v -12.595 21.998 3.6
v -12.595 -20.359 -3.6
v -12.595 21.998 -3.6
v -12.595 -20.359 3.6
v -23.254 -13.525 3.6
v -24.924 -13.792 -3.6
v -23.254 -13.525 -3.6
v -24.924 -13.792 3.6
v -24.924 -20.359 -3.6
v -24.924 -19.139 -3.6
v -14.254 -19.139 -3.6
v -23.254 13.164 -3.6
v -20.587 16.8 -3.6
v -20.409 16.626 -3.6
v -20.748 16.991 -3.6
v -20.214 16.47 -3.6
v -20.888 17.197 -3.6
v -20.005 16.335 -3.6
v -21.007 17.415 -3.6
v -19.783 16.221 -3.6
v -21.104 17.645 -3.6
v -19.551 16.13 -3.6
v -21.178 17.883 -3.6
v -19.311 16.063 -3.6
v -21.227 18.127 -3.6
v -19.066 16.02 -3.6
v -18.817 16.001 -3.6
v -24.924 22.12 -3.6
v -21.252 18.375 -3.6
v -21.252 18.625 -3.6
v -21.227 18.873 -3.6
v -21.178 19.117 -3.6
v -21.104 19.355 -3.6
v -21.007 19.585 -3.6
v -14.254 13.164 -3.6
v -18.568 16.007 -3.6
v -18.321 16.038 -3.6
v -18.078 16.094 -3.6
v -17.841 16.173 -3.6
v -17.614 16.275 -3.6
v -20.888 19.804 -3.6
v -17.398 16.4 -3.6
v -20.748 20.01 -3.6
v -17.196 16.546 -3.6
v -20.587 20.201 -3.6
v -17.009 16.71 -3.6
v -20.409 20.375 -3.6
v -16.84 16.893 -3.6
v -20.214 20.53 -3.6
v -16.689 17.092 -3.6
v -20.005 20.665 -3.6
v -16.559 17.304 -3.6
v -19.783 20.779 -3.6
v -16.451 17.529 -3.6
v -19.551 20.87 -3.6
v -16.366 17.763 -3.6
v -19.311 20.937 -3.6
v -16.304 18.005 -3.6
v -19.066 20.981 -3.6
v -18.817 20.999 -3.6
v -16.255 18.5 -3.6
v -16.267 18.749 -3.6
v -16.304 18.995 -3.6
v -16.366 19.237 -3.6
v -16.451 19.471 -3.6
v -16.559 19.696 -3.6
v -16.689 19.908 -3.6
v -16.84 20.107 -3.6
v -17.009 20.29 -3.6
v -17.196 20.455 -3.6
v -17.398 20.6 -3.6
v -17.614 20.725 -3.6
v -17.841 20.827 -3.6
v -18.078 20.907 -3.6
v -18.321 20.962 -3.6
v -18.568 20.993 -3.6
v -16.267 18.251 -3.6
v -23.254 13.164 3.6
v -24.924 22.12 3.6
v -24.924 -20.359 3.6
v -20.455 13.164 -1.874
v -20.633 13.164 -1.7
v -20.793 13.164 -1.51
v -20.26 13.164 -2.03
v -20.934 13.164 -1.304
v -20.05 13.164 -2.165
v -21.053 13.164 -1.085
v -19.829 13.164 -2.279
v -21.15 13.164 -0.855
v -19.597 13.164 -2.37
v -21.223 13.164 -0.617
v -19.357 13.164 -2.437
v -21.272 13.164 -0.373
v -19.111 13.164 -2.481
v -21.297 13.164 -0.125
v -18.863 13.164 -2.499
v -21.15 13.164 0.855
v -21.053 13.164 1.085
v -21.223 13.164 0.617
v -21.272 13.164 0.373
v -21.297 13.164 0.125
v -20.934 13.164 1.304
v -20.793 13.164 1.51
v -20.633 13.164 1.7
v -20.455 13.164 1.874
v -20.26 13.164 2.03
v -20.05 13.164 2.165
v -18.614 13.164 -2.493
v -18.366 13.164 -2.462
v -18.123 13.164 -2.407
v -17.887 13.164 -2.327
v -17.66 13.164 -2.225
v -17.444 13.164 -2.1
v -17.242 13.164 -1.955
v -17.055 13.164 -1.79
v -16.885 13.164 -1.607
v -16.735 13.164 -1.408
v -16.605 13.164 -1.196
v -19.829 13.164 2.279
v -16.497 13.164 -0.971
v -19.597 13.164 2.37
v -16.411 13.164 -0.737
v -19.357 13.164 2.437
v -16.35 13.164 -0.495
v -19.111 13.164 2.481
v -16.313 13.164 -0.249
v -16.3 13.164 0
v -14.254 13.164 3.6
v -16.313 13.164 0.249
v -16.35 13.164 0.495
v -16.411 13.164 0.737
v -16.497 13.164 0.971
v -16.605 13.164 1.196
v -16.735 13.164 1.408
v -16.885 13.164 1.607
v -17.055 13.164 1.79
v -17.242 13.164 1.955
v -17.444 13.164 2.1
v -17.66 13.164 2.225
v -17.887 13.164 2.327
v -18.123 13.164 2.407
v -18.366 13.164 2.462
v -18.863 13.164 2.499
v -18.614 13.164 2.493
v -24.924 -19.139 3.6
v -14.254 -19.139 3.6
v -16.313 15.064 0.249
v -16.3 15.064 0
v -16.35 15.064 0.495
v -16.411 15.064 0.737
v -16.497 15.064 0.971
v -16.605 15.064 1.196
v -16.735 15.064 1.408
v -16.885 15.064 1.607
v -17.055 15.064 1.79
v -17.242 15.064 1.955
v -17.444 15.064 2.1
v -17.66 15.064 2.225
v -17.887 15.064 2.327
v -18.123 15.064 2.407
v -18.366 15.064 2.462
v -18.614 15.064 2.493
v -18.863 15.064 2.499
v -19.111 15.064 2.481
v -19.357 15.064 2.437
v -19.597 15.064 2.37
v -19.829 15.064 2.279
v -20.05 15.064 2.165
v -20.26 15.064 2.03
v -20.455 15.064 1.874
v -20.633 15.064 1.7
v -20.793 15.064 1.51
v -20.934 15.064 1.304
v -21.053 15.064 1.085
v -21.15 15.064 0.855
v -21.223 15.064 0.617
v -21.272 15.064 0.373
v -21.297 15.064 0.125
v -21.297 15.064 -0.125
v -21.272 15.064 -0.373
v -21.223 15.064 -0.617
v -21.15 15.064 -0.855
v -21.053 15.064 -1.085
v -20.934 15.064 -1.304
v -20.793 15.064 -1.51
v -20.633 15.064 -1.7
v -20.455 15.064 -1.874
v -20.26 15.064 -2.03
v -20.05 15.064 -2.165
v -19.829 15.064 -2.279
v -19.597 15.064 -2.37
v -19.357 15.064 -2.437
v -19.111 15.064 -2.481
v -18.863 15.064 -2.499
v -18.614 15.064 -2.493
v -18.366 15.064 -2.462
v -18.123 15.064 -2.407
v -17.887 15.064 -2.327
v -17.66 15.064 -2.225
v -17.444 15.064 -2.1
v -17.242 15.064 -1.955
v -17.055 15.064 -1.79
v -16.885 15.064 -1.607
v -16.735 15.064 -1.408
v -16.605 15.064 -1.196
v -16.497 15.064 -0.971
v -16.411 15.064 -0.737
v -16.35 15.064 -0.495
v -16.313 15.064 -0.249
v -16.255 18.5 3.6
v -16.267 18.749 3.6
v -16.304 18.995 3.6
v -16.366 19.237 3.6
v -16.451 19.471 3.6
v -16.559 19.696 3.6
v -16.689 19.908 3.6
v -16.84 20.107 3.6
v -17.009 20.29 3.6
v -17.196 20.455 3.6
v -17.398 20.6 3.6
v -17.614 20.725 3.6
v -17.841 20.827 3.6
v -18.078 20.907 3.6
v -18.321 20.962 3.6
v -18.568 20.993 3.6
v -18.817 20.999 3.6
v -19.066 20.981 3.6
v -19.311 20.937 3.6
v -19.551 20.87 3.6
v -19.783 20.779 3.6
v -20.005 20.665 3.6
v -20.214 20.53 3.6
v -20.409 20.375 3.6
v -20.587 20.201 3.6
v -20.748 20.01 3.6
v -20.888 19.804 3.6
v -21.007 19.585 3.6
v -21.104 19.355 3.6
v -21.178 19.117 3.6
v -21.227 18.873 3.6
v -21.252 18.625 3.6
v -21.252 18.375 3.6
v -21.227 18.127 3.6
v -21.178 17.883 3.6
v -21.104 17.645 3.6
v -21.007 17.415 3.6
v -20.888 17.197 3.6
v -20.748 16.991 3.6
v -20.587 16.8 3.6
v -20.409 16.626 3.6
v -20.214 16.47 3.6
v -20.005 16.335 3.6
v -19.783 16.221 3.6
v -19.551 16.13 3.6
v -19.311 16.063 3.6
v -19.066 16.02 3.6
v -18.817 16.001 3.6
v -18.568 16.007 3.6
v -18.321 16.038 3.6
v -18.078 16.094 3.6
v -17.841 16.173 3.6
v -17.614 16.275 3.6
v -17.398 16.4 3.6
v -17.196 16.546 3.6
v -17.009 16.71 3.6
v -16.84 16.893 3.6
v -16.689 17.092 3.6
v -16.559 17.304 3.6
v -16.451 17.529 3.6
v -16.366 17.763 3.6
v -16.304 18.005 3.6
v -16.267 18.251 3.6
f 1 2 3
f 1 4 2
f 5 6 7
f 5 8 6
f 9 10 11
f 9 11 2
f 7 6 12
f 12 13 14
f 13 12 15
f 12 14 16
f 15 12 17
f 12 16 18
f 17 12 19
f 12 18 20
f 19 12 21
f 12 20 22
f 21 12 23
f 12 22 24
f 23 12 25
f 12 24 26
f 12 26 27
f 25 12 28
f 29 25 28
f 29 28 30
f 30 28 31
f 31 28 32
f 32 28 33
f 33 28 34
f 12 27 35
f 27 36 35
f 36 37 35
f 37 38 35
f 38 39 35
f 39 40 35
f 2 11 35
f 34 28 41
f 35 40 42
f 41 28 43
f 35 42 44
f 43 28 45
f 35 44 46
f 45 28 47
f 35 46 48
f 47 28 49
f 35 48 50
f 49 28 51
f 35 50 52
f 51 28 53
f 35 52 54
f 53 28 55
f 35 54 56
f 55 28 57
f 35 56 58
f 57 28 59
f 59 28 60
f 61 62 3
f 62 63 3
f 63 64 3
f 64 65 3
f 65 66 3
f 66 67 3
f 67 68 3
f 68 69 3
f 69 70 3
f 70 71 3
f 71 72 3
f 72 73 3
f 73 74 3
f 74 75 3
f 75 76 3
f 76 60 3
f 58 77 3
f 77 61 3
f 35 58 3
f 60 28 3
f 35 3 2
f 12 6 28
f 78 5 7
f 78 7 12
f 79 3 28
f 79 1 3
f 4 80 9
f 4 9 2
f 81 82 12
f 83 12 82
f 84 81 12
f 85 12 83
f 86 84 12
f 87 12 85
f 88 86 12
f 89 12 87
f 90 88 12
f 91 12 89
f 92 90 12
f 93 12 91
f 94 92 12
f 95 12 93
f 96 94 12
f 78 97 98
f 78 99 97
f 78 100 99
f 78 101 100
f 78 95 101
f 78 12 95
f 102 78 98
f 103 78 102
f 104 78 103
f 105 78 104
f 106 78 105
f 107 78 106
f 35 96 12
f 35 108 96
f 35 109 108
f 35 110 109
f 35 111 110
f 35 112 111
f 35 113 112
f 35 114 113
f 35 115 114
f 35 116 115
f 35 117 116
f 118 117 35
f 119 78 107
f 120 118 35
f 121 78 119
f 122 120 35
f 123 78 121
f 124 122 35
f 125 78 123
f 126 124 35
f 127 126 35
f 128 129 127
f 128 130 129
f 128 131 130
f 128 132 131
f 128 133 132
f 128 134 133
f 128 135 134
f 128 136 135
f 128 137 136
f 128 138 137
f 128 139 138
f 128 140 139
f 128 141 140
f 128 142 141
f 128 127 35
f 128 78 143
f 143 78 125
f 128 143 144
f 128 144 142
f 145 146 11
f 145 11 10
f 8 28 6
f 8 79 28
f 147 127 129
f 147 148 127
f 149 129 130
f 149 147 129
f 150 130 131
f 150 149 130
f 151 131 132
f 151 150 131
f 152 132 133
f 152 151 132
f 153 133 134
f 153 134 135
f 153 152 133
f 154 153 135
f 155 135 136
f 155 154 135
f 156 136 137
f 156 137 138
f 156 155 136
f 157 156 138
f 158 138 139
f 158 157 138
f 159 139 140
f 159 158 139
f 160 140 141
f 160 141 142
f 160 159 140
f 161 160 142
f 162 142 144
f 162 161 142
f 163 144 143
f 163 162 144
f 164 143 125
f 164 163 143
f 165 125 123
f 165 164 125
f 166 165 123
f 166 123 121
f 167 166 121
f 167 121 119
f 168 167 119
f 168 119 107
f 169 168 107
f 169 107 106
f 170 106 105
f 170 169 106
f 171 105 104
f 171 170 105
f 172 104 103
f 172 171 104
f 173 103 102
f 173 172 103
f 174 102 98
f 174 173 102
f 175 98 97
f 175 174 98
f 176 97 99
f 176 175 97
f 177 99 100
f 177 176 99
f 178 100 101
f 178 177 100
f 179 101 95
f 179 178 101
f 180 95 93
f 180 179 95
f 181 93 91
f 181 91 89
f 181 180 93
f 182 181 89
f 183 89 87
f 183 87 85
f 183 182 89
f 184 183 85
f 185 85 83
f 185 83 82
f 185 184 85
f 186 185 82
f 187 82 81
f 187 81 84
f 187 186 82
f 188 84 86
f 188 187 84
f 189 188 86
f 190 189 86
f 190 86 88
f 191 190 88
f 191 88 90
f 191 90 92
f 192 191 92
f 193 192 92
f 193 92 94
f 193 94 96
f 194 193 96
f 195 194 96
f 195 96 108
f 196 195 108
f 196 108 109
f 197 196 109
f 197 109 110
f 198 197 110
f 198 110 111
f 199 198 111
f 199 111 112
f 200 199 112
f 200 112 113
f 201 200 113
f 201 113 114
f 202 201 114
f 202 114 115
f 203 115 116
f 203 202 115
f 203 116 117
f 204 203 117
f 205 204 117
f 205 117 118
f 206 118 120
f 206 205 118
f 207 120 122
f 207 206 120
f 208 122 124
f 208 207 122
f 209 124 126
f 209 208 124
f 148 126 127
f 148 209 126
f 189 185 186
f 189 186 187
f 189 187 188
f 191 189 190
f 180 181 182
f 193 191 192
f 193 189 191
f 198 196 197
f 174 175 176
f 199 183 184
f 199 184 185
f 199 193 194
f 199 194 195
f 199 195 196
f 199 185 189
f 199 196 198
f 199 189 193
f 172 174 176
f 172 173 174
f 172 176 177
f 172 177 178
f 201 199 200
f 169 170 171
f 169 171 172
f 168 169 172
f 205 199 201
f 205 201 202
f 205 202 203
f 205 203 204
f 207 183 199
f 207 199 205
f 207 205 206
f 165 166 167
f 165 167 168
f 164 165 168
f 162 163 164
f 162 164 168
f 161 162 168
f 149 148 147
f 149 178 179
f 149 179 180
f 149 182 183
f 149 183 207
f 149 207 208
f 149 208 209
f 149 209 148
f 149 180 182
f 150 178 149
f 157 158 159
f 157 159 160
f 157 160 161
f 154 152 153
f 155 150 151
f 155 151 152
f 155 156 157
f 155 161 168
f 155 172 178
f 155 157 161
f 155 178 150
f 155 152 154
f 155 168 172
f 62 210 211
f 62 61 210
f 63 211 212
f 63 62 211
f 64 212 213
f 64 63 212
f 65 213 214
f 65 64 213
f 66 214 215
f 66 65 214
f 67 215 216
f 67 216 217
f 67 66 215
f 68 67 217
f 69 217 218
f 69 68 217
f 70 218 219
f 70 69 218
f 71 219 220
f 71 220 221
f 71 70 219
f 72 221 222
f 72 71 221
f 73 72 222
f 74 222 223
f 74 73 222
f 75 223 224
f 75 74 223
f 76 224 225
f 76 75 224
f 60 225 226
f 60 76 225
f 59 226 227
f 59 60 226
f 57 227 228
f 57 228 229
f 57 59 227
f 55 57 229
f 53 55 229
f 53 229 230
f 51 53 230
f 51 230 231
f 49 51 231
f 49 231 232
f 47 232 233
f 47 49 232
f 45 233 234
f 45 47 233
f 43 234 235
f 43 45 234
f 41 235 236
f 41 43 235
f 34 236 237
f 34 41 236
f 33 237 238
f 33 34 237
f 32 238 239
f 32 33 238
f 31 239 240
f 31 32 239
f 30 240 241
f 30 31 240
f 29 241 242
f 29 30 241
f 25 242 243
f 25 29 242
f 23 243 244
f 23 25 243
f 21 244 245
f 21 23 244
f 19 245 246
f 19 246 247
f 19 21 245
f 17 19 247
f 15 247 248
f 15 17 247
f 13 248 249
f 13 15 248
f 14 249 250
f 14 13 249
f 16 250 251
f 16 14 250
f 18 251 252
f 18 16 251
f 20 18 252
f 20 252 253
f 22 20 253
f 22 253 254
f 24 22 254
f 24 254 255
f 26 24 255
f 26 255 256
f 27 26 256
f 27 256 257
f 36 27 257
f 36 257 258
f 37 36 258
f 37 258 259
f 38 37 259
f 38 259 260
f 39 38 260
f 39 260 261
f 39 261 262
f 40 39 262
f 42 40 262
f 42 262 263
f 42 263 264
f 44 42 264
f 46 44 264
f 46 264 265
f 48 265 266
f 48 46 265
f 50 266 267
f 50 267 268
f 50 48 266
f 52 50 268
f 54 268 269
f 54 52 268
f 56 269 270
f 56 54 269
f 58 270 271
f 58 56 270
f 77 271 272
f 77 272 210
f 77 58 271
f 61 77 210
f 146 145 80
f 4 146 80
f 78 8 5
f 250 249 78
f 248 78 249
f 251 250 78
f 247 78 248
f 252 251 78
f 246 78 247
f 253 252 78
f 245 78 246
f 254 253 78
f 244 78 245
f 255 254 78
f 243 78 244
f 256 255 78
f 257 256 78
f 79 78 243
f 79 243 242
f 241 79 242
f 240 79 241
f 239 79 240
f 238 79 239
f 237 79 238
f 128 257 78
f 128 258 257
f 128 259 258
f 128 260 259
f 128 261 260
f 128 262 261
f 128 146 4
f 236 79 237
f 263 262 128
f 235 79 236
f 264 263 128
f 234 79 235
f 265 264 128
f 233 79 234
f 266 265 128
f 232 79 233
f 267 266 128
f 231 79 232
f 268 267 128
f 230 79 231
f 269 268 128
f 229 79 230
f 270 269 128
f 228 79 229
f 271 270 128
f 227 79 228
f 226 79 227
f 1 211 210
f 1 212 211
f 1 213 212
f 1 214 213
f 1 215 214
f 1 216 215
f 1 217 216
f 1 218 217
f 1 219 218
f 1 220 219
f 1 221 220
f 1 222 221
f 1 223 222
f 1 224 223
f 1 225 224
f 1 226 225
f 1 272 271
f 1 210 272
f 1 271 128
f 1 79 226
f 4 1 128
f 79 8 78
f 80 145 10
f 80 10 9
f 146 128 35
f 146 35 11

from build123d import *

# Parameters (mm, degrees)
F0_R     = 2.5
F1_DEPTH = 3.6
F2_W     = 9
F2_H     = 7.2
F2_R     = 2.5
F3_DEPTH = 0.8
F4_DEPTH = 1.9


with BuildPart() as f1:
    # F0 (on Top) → F1 (new body, symmetric)
    with BuildSketch(Plane.XY):
        Polygon((-23.254177, -13.525072), (-23.254177, 15.064048), (-14.254177, 15.064048), (-14.254177, -19.138907), (-24.92434, -19.138907), (-24.92434, -20.359321), (-12.594674, -20.359321), (-12.594674, 21.997963), (-24.92434, 22.119868), (-24.92434, -13.792475), align=None)
        with Locations((-18.754847, 18.500099)):
            Circle(F0_R, mode=Mode.SUBTRACT)
    extrude(amount=F1_DEPTH, both=True)

    # F2 (on face) → F3 (join)
    with BuildSketch(Plane.XZ.offset(-15.064048)):
        with Locations((-18.754177, 0)):
            Rectangle(F2_W, F2_H)
        with Locations((-18.800411, 0)):
            Circle(F2_R, mode=Mode.SUBTRACT)
    extrude(amount=F3_DEPTH)

    # F2 (on face) → F4 (join)
    with BuildSketch(Plane.XZ.offset(-15.064048)):
        with Locations((-18.754177, 0)):
            Rectangle(F2_W, F2_H)
        with Locations((-18.800411, 0)):
            Circle(F2_R, mode=Mode.SUBTRACT)
    extrude(amount=F4_DEPTH)


solid = f1.part
